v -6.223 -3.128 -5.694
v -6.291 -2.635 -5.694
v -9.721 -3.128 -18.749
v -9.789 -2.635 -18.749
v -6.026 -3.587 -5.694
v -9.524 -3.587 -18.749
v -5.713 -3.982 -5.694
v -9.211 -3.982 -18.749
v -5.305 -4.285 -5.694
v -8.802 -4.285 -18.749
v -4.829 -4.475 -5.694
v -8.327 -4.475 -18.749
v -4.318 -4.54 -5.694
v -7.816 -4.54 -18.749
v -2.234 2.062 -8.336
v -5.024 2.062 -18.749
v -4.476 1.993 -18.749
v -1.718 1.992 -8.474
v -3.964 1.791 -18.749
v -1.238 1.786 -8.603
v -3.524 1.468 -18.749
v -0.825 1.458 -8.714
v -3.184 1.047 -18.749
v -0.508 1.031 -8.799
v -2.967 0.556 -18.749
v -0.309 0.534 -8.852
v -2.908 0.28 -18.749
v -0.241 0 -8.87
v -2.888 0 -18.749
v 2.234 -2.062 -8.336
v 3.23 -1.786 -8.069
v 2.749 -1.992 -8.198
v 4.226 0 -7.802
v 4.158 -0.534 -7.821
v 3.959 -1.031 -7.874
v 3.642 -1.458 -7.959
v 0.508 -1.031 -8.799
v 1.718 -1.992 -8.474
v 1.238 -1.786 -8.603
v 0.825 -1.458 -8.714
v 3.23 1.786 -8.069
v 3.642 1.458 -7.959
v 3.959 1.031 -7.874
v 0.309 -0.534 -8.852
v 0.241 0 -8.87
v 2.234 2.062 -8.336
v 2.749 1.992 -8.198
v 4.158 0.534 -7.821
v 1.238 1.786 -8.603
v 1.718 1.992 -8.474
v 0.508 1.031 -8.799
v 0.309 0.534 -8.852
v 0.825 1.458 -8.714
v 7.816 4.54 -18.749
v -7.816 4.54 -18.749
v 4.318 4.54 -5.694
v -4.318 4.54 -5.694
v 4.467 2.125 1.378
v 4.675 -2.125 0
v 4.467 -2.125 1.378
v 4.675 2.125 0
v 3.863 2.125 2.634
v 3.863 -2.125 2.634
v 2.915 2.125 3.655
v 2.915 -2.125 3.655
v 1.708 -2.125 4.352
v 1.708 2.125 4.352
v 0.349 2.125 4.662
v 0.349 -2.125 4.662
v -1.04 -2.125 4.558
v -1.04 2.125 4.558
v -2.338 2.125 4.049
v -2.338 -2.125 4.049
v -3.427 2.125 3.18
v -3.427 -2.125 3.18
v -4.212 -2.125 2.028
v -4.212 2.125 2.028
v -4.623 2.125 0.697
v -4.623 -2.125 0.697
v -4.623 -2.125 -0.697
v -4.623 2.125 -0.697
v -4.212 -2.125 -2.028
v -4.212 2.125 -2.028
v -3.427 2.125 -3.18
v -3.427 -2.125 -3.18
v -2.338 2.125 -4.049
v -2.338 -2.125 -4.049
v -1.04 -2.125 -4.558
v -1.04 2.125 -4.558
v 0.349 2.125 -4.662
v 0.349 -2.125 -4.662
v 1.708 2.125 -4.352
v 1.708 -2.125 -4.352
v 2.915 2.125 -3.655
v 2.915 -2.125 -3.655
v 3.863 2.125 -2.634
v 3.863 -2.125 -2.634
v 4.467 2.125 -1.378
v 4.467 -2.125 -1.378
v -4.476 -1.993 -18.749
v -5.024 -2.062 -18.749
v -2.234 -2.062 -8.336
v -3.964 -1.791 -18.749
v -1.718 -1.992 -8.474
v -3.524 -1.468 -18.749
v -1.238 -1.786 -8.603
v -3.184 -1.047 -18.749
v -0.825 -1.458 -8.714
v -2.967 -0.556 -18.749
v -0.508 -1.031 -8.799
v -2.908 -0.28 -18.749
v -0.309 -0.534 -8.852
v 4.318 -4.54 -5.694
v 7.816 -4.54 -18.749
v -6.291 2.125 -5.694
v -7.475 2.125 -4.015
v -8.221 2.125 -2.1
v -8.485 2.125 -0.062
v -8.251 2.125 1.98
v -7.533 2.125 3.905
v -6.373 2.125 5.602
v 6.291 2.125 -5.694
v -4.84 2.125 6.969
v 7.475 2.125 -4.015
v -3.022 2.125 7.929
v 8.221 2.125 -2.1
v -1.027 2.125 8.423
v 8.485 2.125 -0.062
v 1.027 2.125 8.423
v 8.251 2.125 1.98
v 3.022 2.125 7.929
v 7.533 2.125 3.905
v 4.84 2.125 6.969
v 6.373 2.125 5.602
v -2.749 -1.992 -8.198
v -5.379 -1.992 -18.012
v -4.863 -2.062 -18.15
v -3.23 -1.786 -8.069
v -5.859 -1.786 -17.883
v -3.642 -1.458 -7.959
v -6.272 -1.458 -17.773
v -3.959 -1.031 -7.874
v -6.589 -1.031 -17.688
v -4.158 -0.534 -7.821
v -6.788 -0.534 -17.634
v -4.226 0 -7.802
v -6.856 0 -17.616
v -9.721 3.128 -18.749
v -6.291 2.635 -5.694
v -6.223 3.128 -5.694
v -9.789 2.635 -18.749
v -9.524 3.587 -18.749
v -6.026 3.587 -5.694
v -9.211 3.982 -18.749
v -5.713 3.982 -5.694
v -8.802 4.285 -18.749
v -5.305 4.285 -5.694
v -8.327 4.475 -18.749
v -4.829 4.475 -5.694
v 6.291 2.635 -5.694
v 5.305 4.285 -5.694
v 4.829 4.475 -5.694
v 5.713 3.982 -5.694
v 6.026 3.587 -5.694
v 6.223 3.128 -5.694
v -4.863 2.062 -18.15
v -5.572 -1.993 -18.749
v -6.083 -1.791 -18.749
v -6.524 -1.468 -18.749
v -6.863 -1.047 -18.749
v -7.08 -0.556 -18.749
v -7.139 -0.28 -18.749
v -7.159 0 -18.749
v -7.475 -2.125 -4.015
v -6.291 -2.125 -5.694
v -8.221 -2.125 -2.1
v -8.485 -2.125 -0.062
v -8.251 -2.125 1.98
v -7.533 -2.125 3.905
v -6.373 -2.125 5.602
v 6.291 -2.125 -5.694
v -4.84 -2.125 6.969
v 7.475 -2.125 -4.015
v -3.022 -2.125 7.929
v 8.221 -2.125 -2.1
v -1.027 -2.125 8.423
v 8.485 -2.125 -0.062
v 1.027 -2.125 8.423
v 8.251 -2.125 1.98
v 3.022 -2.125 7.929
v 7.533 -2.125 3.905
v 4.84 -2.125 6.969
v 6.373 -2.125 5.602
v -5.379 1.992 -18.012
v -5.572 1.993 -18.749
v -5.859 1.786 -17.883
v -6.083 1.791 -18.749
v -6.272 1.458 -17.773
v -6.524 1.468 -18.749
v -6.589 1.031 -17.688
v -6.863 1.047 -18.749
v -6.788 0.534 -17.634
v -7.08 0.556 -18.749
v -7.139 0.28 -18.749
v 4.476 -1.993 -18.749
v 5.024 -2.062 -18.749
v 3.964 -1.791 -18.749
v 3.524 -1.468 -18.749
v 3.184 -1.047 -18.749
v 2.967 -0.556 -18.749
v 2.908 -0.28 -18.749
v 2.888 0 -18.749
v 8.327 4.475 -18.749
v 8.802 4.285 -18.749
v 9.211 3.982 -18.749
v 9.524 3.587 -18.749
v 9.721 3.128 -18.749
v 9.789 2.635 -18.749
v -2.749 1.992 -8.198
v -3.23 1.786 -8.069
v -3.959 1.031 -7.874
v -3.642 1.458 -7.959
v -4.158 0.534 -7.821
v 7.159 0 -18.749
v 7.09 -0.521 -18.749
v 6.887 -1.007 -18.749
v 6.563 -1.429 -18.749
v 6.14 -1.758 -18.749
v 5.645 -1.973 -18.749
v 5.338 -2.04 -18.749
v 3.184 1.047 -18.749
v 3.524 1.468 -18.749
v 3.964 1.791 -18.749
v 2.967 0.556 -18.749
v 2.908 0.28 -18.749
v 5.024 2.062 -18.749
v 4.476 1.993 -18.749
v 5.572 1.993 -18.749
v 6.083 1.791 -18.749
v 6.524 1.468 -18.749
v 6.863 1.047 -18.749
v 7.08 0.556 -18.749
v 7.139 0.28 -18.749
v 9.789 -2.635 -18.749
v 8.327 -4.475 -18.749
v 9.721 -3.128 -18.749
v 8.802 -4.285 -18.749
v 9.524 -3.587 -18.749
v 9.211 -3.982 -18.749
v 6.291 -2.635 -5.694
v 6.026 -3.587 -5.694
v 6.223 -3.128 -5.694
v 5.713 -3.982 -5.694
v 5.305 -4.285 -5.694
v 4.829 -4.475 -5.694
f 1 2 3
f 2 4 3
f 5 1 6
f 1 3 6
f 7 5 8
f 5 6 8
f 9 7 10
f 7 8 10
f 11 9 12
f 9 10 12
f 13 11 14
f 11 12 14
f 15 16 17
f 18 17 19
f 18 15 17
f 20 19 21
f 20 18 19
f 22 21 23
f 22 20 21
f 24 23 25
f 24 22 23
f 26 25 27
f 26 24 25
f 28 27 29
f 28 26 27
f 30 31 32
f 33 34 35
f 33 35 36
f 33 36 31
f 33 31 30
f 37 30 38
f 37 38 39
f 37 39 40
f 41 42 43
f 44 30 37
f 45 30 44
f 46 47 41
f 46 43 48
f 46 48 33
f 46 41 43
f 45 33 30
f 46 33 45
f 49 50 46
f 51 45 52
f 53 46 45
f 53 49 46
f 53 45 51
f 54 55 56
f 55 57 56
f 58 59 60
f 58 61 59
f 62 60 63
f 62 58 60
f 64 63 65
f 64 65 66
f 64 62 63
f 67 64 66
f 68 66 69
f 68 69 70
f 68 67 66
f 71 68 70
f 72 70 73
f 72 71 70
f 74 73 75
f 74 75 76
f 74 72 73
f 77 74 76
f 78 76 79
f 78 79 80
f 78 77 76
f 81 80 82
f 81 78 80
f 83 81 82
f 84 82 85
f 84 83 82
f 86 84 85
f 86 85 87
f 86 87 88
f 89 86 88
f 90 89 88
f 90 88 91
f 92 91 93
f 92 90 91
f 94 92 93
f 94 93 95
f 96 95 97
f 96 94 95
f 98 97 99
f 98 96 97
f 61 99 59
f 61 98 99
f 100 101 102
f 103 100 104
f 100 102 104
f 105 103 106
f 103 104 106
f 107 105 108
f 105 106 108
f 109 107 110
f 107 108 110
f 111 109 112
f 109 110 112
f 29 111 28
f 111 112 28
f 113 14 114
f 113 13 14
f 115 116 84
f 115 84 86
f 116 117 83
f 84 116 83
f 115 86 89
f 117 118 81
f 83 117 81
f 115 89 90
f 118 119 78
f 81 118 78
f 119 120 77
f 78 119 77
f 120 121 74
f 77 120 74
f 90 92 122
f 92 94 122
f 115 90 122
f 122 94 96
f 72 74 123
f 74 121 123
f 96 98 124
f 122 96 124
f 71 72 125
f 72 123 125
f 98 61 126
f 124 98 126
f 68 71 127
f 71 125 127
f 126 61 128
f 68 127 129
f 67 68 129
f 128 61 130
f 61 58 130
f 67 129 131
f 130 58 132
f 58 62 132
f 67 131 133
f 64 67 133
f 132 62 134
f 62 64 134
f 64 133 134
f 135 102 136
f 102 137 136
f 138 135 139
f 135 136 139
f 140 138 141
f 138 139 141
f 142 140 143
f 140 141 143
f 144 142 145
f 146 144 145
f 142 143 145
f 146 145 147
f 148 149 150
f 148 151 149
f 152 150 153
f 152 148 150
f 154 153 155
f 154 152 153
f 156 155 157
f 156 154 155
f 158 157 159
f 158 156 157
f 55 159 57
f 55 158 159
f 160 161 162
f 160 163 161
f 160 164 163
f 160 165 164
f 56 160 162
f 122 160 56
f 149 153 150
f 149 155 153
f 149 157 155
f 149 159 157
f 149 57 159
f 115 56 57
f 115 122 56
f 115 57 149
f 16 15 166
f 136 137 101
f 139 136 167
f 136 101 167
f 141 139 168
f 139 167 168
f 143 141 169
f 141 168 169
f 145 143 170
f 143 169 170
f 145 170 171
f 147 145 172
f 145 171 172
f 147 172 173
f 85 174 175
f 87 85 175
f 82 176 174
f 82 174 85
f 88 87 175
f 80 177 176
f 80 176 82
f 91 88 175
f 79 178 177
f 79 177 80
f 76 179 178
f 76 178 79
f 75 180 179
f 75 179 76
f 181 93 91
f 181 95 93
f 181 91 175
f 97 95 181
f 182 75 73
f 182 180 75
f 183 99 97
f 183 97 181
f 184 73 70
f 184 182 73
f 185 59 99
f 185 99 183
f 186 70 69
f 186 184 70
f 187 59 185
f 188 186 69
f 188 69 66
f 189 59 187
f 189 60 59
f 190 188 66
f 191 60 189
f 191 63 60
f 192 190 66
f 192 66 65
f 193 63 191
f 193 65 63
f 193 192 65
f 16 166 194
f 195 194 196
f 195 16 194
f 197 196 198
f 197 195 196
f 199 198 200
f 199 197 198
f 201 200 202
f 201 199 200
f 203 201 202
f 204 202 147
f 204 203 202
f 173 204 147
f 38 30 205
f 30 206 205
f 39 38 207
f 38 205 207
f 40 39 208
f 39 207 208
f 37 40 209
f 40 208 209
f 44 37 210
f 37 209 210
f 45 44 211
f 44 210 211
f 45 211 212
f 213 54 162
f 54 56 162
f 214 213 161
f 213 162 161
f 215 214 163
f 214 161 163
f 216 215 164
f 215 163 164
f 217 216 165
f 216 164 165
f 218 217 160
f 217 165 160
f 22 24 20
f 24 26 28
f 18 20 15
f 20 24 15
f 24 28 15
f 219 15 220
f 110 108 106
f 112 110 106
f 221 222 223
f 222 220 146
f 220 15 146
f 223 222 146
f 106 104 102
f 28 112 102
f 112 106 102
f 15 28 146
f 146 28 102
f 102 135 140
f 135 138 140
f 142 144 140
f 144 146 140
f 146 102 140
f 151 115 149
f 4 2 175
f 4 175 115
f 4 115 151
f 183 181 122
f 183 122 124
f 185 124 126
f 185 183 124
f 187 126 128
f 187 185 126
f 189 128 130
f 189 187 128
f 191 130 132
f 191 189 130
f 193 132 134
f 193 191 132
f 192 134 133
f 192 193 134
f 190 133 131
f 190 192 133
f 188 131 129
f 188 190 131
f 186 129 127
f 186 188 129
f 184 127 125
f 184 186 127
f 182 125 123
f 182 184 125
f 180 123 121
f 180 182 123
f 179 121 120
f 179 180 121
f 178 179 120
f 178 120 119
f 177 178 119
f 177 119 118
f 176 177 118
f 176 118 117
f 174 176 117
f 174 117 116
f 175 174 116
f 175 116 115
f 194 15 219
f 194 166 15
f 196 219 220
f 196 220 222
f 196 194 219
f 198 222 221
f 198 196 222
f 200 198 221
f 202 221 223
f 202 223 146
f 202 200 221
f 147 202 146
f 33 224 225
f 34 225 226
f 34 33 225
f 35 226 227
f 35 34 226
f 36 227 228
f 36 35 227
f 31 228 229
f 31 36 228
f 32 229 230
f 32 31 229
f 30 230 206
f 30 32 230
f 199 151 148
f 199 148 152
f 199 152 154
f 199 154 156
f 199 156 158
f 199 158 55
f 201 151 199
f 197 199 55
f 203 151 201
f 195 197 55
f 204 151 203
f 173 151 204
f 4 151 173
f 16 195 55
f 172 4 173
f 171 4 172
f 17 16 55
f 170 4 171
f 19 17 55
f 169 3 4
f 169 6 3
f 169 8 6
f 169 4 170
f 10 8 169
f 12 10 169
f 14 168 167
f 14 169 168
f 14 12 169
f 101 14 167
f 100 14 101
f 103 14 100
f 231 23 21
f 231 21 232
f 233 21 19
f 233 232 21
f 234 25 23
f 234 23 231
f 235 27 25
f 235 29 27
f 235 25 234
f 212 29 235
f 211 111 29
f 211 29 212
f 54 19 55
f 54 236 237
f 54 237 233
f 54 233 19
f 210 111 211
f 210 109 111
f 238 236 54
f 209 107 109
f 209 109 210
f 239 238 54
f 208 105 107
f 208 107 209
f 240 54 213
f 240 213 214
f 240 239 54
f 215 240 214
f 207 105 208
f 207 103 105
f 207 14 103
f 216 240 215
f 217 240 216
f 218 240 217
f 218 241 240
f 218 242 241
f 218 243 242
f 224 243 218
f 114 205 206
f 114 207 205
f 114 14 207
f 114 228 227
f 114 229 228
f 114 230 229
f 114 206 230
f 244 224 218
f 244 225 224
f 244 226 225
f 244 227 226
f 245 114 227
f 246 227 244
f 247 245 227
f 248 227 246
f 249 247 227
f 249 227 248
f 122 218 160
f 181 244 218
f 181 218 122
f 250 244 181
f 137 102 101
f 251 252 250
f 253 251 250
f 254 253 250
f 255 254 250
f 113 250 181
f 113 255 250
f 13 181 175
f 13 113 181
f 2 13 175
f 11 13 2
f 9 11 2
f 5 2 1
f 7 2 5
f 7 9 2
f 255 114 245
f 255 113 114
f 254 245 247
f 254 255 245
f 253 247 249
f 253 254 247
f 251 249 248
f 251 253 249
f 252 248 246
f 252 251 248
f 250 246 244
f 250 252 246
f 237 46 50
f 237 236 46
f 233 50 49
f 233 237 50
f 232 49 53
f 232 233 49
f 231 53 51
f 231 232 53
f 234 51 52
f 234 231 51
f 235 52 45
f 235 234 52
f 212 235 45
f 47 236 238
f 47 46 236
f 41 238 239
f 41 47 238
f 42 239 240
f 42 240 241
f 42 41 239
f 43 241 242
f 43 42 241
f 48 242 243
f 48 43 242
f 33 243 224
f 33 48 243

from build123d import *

# Parameters (mm, degrees)
F0_R     = 8.485
F0_R_2   = 4.675
F1_DEPTH = 2.125
F3_DEPTH = 4.539996
F5_DEPTH = 2.0625
F6_R     = 2.06249
F7_R     = 1.905


# Not quite as in the source:
# - a fillet or chamfer is up to 0.001 mm smaller than in the source, because OpenCascade refuses the exact size


with BuildPart() as f1:
    # F0 (on Front) → F1 (new body, symmetric)
    with BuildSketch(Plane.XZ):
        Circle(F0_R)
        Circle(F0_R_2, mode=Mode.SUBTRACT)
    extrude(amount=F1_DEPTH, both=True)

    # F2 (on Front) → F3 (join, symmetric)
    with BuildSketch(Plane.XZ):
        Polygon((-6.2906053879, -5.6941644561), (-9.7885362858, -18.7486202883), (9.7885362858, -18.7486202883), (6.2906053879, -5.6941644561), align=None)
    extrude(amount=F3_DEPTH, both=True)

    # F4 (on Front) → F5 (cut, symmetric)
    with BuildSketch(Plane.XZ):
        Polygon((4.22592549, -7.8024805709), (0.2414814566, -8.8701091319), (2.8884205433, -18.7486202883), (7.1589347875, -18.7486202883), align=None)
        Polygon((-0.2414814566, -8.8701091319), (-4.22592549, -7.8024805709), (-6.8555269883, -17.6162869659), (-7.1589347875, -18.7486202883), (-2.8884205433, -18.7486202883), align=None)
    extrude(amount=F5_DEPTH, both=True, mode=Mode.SUBTRACT)

    # F6 (radius 2.0625 in the source; OpenCascade refuses exactly that, so slightly less here)
    f6_edges = [f1.edges().sort_by_distance(p)[0] for p in [
        (-5.69243, -2.0625, -13.27555),
        (1.564951, -2.0625, -13.809365),
        (5.69243, -2.0625, -13.27555),
        (-1.564951, -2.0625, -13.809365),
        (5.69243, 2.0625, -13.27555),
        (-1.564951, 2.0625, -13.809365),
        (-5.69243, 2.0625, -13.27555),
        (1.564951, 2.0625, -13.809365),
    ]]
    fillet(f6_edges, radius=F6_R)

    # F7
    f7_edges = [f1.edges().sort_by_distance(p)[0] for p in [
        (8.039571, 4.539996, -12.221392),
        (8.039571, -4.539996, -12.221392),
        (-8.039571, 4.539996, -12.221392),
        (-8.039571, -4.539996, -12.221392),
    ]]
    fillet(f7_edges, radius=F7_R)


solid = f1.part
